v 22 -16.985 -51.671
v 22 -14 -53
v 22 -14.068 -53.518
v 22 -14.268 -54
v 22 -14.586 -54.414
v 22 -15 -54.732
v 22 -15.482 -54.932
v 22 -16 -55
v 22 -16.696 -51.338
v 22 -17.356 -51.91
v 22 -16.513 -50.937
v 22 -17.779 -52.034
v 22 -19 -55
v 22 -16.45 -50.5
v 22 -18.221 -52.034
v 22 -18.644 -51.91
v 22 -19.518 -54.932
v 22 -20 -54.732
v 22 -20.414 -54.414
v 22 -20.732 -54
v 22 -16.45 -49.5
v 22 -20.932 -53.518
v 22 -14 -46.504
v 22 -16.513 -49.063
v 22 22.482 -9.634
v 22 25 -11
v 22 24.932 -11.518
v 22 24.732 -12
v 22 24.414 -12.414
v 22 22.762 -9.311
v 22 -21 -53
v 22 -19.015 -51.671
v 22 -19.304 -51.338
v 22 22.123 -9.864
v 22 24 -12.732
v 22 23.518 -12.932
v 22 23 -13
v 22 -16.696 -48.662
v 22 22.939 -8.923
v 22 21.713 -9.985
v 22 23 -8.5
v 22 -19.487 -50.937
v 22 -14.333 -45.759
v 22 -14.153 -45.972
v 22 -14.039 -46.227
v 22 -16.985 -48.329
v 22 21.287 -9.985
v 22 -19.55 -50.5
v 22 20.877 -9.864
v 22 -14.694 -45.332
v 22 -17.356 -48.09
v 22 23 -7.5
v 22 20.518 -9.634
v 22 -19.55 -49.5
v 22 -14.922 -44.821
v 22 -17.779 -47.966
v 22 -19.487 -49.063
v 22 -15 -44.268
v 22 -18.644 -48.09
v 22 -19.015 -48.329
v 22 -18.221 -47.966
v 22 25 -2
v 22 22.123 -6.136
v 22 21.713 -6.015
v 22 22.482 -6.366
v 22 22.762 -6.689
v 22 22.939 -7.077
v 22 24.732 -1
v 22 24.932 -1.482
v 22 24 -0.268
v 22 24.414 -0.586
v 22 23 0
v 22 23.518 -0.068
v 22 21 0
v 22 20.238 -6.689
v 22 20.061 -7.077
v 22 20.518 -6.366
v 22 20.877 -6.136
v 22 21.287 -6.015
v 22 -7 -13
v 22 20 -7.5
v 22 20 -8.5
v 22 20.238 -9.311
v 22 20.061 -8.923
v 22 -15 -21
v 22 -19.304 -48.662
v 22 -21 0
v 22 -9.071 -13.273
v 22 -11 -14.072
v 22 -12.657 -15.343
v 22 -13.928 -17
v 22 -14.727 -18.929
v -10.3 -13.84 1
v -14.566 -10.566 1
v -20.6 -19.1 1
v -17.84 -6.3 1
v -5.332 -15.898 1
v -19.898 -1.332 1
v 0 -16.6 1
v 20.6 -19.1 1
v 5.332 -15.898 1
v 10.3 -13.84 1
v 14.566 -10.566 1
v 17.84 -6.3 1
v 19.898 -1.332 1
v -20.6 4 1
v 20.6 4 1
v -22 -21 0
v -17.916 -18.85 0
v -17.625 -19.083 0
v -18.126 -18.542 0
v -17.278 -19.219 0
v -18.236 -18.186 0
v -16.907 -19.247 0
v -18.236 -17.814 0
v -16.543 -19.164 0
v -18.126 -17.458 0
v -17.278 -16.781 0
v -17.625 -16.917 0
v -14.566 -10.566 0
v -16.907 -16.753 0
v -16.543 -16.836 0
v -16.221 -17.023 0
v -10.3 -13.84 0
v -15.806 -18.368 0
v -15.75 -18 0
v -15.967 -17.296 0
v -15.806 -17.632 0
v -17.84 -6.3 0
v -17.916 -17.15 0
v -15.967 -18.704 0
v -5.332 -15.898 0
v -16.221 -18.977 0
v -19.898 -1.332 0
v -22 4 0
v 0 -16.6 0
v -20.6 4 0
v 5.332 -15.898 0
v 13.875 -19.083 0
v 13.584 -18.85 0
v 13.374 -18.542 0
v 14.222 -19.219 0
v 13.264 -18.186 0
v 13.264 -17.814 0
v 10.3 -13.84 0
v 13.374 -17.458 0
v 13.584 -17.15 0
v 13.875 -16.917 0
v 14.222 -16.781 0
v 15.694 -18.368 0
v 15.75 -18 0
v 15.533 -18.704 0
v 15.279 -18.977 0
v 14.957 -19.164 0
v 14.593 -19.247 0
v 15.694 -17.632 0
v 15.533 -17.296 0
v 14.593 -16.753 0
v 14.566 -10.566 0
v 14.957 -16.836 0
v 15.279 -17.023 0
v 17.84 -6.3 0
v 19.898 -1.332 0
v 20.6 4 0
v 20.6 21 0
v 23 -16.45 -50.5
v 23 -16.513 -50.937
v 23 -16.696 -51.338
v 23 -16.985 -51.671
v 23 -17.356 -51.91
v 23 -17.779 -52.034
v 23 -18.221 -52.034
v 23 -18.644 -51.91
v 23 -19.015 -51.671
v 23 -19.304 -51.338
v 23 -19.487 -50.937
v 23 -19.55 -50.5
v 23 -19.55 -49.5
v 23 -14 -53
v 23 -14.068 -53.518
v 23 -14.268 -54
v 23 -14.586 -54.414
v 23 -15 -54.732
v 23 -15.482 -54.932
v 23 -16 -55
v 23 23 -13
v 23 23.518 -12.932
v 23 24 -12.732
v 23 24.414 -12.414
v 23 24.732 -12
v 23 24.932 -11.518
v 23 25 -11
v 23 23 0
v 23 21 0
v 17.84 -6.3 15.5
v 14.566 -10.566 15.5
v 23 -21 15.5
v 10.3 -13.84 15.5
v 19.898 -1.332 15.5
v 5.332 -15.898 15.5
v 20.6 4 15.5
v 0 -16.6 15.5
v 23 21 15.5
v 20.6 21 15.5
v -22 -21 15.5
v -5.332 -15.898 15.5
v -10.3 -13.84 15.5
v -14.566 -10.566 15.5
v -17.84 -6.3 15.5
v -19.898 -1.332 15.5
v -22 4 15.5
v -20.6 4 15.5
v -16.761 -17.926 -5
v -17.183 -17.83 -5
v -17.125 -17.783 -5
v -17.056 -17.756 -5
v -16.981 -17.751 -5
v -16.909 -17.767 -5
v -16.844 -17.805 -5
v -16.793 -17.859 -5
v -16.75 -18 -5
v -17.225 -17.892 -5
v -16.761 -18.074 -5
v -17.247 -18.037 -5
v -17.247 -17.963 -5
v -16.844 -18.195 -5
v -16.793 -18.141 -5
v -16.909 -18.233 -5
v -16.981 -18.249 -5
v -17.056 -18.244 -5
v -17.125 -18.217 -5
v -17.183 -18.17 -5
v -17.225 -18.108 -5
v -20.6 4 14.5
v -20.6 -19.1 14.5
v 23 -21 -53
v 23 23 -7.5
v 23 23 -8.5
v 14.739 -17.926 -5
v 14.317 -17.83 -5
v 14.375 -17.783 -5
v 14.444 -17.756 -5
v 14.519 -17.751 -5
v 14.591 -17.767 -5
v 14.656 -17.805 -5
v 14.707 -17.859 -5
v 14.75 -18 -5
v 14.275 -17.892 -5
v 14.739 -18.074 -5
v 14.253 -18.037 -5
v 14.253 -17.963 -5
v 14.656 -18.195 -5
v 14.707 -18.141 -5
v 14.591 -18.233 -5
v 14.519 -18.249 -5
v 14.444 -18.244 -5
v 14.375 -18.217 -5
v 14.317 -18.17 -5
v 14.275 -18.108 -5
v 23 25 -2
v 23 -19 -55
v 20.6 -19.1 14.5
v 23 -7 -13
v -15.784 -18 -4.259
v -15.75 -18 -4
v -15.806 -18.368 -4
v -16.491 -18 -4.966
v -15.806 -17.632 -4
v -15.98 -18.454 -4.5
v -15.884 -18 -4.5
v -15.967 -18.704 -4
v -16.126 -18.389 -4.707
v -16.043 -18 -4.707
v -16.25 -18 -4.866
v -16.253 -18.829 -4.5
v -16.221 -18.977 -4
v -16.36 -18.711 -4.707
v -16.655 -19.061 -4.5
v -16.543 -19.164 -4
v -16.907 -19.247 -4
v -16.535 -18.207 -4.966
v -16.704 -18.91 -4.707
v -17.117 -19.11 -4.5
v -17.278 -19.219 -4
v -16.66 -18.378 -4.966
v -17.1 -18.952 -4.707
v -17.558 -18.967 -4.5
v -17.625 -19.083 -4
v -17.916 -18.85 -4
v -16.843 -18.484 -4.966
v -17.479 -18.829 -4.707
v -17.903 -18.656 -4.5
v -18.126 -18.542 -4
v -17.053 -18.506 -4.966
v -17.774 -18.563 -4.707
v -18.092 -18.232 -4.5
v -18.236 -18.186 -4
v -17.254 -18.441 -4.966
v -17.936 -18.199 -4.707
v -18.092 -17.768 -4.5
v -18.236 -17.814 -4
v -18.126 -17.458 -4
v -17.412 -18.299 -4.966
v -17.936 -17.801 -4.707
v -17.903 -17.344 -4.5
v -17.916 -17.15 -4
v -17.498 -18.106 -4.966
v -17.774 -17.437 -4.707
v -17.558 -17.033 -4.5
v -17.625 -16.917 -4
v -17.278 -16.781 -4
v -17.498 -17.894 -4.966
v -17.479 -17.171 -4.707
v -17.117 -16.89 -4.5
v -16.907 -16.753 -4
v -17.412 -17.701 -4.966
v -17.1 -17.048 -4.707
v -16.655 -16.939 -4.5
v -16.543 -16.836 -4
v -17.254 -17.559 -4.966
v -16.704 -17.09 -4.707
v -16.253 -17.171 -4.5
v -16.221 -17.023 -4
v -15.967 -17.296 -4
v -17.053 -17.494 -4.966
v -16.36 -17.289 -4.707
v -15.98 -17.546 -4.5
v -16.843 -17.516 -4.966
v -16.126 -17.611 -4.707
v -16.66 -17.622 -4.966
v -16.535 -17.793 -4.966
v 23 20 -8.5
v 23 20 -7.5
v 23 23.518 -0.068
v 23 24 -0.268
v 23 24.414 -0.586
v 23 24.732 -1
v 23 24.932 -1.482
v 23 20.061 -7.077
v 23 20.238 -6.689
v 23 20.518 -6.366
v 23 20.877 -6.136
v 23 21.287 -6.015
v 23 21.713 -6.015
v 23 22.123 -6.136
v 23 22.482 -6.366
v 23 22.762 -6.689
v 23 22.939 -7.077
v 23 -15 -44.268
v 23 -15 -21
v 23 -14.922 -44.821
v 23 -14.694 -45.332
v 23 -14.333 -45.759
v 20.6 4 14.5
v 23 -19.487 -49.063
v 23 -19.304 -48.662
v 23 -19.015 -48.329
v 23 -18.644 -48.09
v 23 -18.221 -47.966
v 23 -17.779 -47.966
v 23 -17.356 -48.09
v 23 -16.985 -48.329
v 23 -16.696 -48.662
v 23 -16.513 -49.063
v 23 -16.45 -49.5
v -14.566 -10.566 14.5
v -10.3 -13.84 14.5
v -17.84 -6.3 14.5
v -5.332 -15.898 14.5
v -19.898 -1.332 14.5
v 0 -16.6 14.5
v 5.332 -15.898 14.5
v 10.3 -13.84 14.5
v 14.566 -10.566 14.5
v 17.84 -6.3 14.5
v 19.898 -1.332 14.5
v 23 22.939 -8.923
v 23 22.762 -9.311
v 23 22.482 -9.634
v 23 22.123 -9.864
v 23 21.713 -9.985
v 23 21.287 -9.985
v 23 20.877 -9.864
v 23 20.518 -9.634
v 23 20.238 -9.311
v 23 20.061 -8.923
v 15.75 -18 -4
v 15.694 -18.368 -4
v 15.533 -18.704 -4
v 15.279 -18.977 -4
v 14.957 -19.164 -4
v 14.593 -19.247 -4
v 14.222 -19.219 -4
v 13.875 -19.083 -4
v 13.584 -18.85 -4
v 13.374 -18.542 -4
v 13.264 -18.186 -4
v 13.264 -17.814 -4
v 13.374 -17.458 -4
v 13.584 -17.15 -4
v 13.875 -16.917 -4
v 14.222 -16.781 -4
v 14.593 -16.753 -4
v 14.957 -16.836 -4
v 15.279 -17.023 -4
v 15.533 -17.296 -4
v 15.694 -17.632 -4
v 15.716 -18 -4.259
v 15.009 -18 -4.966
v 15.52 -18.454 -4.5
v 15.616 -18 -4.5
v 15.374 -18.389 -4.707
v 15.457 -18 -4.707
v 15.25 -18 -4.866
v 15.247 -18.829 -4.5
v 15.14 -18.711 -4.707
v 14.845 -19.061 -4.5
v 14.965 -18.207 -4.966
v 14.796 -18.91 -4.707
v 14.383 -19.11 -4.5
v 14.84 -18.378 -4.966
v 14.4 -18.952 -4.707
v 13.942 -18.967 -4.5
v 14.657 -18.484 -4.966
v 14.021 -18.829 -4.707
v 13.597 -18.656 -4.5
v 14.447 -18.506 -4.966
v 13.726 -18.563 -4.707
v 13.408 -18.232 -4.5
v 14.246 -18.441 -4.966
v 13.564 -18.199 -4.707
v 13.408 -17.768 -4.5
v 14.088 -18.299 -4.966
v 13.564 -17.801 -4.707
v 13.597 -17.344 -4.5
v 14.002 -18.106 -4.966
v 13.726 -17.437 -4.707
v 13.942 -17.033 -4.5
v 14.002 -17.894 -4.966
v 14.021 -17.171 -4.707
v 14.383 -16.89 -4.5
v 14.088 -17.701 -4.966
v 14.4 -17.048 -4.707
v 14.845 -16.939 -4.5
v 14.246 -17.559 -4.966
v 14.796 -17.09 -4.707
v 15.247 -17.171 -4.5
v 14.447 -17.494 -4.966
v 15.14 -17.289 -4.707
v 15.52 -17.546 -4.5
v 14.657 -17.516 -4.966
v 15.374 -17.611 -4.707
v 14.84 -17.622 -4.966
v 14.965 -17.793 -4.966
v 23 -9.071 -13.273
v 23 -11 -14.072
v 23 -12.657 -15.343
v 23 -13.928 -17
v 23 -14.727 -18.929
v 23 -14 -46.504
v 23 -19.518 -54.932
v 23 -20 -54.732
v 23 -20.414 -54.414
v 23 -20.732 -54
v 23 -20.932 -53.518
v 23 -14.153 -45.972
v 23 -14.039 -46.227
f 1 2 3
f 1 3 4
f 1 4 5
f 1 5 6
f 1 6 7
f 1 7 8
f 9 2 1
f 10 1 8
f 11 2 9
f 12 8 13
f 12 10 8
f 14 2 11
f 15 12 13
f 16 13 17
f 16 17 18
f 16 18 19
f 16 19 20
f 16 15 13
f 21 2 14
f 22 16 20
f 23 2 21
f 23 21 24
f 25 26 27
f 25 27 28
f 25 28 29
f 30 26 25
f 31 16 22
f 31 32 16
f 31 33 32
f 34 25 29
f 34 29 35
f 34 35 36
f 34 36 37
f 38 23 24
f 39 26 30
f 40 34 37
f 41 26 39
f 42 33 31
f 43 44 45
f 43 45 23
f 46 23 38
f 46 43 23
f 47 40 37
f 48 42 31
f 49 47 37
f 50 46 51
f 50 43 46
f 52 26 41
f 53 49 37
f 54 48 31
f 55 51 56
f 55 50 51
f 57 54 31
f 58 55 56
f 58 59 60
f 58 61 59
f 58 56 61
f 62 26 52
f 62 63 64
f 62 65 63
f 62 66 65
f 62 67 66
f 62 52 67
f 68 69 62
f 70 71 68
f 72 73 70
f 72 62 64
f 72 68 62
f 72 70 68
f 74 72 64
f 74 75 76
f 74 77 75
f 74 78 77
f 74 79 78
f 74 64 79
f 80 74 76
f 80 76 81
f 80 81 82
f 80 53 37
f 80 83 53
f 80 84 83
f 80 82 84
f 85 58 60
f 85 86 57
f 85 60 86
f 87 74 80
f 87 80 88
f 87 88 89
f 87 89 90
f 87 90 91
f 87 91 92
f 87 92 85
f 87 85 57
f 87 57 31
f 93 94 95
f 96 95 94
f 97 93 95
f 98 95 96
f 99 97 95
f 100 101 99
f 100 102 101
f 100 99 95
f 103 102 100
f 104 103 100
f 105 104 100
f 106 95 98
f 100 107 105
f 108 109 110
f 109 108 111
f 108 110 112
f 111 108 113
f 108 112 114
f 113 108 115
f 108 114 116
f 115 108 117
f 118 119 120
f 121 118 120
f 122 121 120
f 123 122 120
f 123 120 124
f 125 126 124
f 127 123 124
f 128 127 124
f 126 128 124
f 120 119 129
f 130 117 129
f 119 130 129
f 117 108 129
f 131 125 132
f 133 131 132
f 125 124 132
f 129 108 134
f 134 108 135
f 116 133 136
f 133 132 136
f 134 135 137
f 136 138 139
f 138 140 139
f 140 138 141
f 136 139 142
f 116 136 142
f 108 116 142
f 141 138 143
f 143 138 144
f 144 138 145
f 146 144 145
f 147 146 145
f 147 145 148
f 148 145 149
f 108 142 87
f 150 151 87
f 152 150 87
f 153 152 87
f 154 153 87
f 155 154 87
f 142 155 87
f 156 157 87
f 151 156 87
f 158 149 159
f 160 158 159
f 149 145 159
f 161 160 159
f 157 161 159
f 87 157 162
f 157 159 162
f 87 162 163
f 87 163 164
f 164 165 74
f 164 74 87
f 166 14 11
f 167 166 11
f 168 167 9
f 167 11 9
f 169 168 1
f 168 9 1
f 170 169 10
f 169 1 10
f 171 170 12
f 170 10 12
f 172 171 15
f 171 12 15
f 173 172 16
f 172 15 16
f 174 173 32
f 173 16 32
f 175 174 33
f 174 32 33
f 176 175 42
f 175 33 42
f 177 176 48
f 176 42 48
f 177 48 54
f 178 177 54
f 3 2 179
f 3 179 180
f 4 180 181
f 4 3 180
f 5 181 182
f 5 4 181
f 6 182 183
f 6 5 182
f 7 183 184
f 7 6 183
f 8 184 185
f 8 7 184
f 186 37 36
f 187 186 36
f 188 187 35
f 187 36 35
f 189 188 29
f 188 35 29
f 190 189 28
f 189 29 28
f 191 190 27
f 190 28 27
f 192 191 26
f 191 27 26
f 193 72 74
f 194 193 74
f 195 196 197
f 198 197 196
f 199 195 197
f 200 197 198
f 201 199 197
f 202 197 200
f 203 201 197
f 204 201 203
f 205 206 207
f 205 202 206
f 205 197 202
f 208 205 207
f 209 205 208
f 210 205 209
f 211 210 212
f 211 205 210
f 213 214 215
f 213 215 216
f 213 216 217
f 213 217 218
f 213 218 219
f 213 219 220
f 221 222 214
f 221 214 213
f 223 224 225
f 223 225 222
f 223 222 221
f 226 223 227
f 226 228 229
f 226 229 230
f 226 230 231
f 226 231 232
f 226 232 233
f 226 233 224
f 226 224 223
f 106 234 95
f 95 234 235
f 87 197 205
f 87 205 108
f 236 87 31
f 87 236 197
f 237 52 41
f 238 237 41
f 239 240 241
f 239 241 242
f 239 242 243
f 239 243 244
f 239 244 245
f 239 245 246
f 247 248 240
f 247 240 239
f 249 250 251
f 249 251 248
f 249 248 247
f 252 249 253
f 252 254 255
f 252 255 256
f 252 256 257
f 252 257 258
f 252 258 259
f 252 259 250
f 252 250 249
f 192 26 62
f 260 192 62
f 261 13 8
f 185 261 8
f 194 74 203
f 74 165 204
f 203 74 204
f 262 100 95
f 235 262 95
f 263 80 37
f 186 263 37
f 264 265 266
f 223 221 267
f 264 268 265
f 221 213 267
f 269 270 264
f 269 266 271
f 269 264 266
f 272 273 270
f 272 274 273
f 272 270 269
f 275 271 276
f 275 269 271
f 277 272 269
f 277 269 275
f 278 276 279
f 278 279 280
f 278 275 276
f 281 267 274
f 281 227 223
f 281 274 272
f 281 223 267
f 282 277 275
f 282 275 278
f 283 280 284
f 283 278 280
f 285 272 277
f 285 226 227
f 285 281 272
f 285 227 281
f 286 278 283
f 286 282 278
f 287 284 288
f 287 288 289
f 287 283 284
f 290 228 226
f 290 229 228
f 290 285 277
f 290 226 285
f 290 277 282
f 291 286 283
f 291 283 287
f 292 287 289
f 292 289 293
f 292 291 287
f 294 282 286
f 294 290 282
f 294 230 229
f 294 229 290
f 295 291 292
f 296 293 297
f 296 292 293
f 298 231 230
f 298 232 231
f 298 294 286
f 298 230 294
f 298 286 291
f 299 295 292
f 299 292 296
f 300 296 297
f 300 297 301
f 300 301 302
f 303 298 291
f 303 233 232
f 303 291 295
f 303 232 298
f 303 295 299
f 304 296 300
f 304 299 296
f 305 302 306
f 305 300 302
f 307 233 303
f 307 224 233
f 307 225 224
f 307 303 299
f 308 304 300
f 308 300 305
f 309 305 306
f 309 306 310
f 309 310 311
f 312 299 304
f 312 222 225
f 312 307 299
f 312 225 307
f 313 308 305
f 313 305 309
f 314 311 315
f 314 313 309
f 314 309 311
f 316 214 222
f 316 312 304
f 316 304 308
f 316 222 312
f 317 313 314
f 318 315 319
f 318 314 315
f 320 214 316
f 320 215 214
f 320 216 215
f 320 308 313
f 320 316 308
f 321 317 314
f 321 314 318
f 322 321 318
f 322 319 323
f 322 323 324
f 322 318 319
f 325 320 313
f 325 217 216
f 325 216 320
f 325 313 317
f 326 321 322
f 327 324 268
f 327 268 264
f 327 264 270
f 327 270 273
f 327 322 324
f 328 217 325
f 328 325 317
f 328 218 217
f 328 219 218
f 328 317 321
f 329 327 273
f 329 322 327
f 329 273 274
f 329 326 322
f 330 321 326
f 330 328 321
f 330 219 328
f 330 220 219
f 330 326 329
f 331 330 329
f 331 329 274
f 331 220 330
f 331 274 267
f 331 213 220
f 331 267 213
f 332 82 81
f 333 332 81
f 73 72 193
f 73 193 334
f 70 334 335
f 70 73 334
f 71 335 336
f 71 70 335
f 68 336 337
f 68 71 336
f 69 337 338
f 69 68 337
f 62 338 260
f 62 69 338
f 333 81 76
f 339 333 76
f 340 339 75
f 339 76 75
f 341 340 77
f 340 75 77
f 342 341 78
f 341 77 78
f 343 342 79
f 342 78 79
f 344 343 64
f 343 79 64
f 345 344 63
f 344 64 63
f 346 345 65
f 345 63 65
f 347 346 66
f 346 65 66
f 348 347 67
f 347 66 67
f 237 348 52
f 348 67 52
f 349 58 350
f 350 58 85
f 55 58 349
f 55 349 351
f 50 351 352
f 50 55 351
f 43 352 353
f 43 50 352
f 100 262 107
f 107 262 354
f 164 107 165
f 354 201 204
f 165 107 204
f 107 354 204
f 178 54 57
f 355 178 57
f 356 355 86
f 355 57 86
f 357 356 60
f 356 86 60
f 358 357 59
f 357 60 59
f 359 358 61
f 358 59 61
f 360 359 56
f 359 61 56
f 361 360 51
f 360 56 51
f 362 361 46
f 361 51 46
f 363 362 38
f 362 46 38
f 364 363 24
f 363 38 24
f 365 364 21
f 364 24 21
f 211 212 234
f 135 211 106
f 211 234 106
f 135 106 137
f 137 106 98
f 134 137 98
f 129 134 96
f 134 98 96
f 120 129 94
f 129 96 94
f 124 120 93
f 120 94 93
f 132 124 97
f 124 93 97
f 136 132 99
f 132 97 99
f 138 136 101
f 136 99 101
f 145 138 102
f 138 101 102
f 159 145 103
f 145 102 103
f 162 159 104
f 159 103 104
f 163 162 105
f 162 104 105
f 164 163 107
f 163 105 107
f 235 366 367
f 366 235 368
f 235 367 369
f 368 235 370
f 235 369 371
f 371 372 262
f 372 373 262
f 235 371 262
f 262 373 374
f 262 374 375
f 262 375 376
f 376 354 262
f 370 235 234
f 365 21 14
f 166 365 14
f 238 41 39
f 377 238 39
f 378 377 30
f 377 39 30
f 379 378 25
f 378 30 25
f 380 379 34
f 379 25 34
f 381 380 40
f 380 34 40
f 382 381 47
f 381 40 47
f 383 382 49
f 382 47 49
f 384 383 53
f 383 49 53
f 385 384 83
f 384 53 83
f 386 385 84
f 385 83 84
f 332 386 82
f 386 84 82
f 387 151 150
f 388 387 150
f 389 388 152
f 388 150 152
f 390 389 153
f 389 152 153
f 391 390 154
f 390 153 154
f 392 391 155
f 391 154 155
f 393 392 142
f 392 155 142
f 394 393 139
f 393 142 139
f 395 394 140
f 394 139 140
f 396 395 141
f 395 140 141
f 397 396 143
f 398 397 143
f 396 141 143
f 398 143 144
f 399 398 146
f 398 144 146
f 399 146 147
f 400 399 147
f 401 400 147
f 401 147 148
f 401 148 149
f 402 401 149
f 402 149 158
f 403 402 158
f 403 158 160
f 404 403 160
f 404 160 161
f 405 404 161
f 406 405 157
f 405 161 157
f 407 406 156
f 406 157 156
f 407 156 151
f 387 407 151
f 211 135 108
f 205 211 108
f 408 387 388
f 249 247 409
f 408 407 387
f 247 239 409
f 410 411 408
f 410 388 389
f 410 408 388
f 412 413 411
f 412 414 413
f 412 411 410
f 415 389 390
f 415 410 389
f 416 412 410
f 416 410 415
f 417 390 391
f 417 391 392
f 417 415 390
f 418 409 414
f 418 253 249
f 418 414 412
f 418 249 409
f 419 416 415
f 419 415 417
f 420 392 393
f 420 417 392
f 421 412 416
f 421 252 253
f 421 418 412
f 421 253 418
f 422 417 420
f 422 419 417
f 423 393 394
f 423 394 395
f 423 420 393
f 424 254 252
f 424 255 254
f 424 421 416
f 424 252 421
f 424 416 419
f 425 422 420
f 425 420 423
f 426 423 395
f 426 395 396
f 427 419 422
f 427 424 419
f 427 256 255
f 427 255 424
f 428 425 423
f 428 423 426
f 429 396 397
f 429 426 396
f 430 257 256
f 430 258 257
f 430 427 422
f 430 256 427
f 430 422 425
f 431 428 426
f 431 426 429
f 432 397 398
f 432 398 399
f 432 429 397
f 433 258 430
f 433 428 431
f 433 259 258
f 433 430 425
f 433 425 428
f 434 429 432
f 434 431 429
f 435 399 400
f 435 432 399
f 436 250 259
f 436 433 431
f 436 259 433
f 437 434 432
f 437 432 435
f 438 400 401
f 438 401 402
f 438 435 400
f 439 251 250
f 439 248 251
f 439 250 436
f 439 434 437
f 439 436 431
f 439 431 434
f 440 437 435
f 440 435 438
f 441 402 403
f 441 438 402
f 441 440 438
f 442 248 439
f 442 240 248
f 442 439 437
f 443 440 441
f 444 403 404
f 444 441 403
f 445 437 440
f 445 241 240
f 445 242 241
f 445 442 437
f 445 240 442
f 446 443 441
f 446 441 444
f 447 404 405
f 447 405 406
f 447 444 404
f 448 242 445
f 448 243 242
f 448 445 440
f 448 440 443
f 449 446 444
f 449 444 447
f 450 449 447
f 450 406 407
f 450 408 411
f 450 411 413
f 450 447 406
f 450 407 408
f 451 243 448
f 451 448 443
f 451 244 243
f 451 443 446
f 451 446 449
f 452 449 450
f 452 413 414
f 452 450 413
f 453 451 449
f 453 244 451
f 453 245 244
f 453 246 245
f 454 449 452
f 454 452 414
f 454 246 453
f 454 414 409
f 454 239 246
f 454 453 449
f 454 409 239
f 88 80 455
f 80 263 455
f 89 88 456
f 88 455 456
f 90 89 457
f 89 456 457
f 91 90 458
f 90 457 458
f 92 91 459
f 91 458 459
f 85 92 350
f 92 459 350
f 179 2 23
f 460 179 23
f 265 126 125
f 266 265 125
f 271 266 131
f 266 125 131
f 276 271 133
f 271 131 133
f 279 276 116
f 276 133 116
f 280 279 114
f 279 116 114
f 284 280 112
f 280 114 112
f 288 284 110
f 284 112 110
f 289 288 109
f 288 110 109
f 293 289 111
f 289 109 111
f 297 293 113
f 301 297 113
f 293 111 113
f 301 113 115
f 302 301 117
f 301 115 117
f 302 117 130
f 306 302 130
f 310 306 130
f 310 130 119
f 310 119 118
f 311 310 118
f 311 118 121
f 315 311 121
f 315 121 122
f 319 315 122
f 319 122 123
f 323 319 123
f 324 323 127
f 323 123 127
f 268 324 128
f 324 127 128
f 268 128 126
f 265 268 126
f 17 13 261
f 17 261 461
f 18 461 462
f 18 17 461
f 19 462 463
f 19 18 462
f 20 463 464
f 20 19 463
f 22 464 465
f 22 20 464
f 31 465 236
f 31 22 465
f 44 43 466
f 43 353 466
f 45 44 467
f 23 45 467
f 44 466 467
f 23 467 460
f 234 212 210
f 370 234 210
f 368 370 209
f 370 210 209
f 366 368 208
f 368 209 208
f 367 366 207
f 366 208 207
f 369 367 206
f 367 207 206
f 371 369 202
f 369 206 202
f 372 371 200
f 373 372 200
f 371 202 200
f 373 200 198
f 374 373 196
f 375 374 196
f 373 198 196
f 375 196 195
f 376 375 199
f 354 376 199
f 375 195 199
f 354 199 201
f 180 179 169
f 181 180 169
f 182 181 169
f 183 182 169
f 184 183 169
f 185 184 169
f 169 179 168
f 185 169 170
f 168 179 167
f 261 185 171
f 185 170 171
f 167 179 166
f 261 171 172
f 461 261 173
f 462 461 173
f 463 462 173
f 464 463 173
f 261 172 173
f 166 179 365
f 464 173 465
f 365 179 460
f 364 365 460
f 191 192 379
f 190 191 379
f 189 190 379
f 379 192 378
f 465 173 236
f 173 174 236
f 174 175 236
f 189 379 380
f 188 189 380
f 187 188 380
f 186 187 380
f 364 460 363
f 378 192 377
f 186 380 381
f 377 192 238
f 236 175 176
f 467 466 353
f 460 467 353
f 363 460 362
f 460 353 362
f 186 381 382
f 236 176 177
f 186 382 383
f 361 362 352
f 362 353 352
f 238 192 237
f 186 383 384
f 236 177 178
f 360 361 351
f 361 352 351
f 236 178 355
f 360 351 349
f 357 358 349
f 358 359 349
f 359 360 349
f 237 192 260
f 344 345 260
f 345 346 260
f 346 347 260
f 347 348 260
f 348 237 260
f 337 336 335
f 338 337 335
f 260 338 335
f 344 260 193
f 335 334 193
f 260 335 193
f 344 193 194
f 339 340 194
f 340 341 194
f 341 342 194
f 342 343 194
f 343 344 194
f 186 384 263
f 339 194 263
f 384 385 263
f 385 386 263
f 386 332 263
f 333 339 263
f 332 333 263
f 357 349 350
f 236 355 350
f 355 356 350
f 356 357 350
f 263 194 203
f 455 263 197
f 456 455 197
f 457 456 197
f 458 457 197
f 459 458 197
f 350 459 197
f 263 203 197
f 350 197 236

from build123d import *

# Parameters (mm, degrees)
F0_W         = 44
F0_H         = 42
F1_DEPTH     = 1
F3_DEPTH     = 13.5
F4_W         = 41.2
F4_H         = 40.1
F5_DEPTH     = 1
F7_DEPTH     = 25
F9_DEPTH     = 1
F11_DEPTH    = 25
F12_W        = 42
F12_H        = 15.5
F12_W_2      = 1
F12_H_2      = 9
F13_DEPTH    = 1
F14_DEPTH    = 25
F15_R        = 8
F16_T1_DEPTH = 1
F16_T3_DEPTH = 11
F16_T5_DEPTH = 11
F16_T7_DEPTH = 11
F16_T9_DEPTH = 11
F8_R         = 1.25
F17_DEPTH    = 5
F18_R        = 1


# Not quite as in the source:
# - a fillet or chamfer that OpenCascade refuses, or shapes differently, is made with other operations: its cross-section is extruded or revolved along the edge and cut away or added
# - a feature names something its author has since deleted; it is built from what else it names


with BuildPart() as f1:
    # F0 (on Top) → F1 (new body)
    with BuildSketch(Plane.XY):
        Rectangle(F0_W, F0_H)
    extrude(amount=F1_DEPTH)

    # F2 (on face) → F3 (join)
    with BuildSketch(Plane.XY.offset(1)):
        Polygon((-20.6, -19.1), (-20.6, 21), (-22, 21), (-22, -21), (22, -21), (22, 21), (20.6, 21), (20.6, -19.1), align=None)
    extrude(amount=F3_DEPTH)

    # F4 (on face) → F5 (join)
    with BuildSketch(Plane.XY.offset(14.5)):
        with Locations((0, 0.95)):
            Rectangle(F4_W, F4_H)
        Polygon((-22, 21), (-22, -21), (22, -21), (22, 21), (20.6, 21), (20.6, -19.1), (-20.6, -19.1), (-20.6, 21), align=None)
    extrude(amount=F5_DEPTH)

    # F6 (on face) → F7 (cut, symmetric)
    with BuildSketch(Plane.XY.offset(1)):
        with BuildLine():
            ThreePointArc((-20.6, 4.0000000362), (-1.81e-08, -16.6), (20.6, 4))
            ThreePointArc((20.6, 4), (18.2212690578, 13.6096490011), (11.6344316578, 21))
            Line((11.6344316578, 21), (-11.6344316578, 21))
            ThreePointArc((-11.6344316578, 21), (-18.2212690493, 13.6096490171), (-20.6, 4.0000000362))
        make_face()
        with BuildLine():
            Line((-20.6, 21), (-20.6, 4.0000000362))
            ThreePointArc((-20.6, 4.0000000362), (-18.2212690493, 13.6096490171), (-11.6344316578, 21))
            Line((-11.6344316578, 21), (-20.6, 21))
        make_face()
        with BuildLine():
            ThreePointArc((11.6344316578, 21), (18.2212690578, 13.6096490011), (20.6, 4))
            Line((20.6, 4), (20.6, 21))
            Line((20.6, 21), (11.6344316578, 21))
        make_face()
    extrude(amount=F7_DEPTH, both=True, mode=Mode.SUBTRACT)

    # F4 (on face) → F9 (join)
    with BuildSketch(Plane.XY.offset(14.5)):
        Polygon((-22, 21), (-22, -21), (22, -21), (22, 21), (20.6, 21), (20.6, -19.1), (-20.6, -19.1), (-20.6, 21), align=None)
    extrude(amount=F9_DEPTH)

    # F10 (on face) → F11 (cut)
    with BuildSketch(Plane.YZ.offset(-20.6)):
        Polygon((21, 0), (21, 15), (21, 15.5), (4, 15.5), (4, 14.5), (4, 1), (4, 0), align=None)
    extrude(amount=-F11_DEPTH, mode=Mode.SUBTRACT)

    # F12 (on face) → F13 (join)
    with BuildSketch(Plane.YZ.offset(22)):
        Polygon((21, 0), (-21, 0), (-21, -13), (-15, -13), (25, -13), (25, 0), align=None)
        with BuildLine():
            Line((23, -7.5), (23, -8.5))
            ThreePointArc((23, -8.5), (21.5, -10), (20, -8.5))
            Line((20, -8.5), (20, -7.5))
            ThreePointArc((20, -7.5), (21.5, -6), (23, -7.5))
        make_face(mode=Mode.SUBTRACT)
        Polygon((-15, -13), (-21, -13), (-21, -55), (-15, -55), (-15, -46), align=None)
        with BuildLine():
            Line((-16.45, -49.5), (-16.45, -50.5))
            ThreePointArc((-16.45, -50.5), (-18, -52.05), (-19.55, -50.5))
            Line((-19.55, -50.5), (-19.55, -49.5))
            ThreePointArc((-19.55, -49.5), (-18, -47.95), (-16.45, -49.5))
        make_face(mode=Mode.SUBTRACT)
        with Locations((0, 7.75)):
            Rectangle(F12_W, F12_H)
        with Locations((-14.5, -50.5)):
            Rectangle(F12_W_2, F12_H_2)
    extrude(amount=F13_DEPTH)

    # F12 (on face) → F14 (cut)
    with BuildSketch(Plane.YZ.offset(22)):
        with BuildLine():
            ThreePointArc((-19.55, -50.5), (-18, -52.05), (-16.45, -50.5))
            Line((-16.45, -50.5), (-16.8157280718, -50.5))
            ThreePointArc((-16.8157280718, -50.5), (-18, -51.05), (-19.1842719282, -50.5))
            Line((-19.1842719282, -50.5), (-19.55, -50.5))
        make_face()
        with BuildLine():
            Line((-16.8157280718, -50.5), (-16.45, -50.5))
            ThreePointArc((-16.45, -50.5), (-16.4708552854, -50.2465903676), (-16.5328599249, -50))
            ThreePointArc((-16.5328599249, -50), (-16.6509275769, -50.2632192327), (-16.8157280718, -50.5))
        make_face()
        with BuildLine():
            ThreePointArc((-16.5328599249, -50), (-16.4708552854, -50.2465903676), (-16.45, -50.5))
            Line((-16.45, -50.5), (-16.45, -49.5))
            ThreePointArc((-16.45, -49.5), (-16.4708552854, -49.7534096324), (-16.5328599249, -50))
        make_face()
        with BuildLine():
            ThreePointArc((-16.5328599249, -50), (-16.4708552854, -49.7534096324), (-16.45, -49.5))
            Line((-16.45, -49.5), (-16.8157280718, -49.5))
            ThreePointArc((-16.8157280718, -49.5), (-16.6509275769, -49.7367807673), (-16.5328599249, -50))
        make_face()
        with BuildLine():
            Line((-16.8157280718, -49.5), (-16.45, -49.5))
            ThreePointArc((-16.45, -49.5), (-18, -47.95), (-19.55, -49.5))
            Line((-19.55, -49.5), (-19.1842719282, -49.5))
            ThreePointArc((-19.1842719282, -49.5), (-18, -48.95), (-16.8157280718, -49.5))
        make_face()
        with BuildLine():
            Line((-19.1842719282, -49.5), (-16.8157280718, -49.5))
            ThreePointArc((-16.8157280718, -49.5), (-18, -48.95), (-19.1842719282, -49.5))
        make_face()
        with BuildLine():
            Line((-19.1842719282, -50.5), (-16.8157280718, -50.5))
            ThreePointArc((-16.8157280718, -50.5), (-16.6509275769, -50.2632192327), (-16.5328599249, -50))
            ThreePointArc((-16.5328599249, -50), (-16.6509275769, -49.7367807673), (-16.8157280718, -49.5))
            Line((-16.8157280718, -49.5), (-19.1842719282, -49.5))
            ThreePointArc((-19.1842719282, -49.5), (-19.3490724231, -49.7367807673), (-19.4671400751, -50))
            ThreePointArc((-19.4671400751, -50), (-19.3490724231, -50.2632192327), (-19.1842719282, -50.5))
        make_face()
        with BuildLine():
            ThreePointArc((-19.1842719282, -50.5), (-18, -51.05), (-16.8157280718, -50.5))
            Line((-16.8157280718, -50.5), (-19.1842719282, -50.5))
        make_face()
        with BuildLine():
            ThreePointArc((-19.4671400751, -50), (-19.5291447146, -50.2465903676), (-19.55, -50.5))
            Line((-19.55, -50.5), (-19.1842719282, -50.5))
            ThreePointArc((-19.1842719282, -50.5), (-19.3490724231, -50.2632192327), (-19.4671400751, -50))
        make_face()
        with BuildLine():
            Line((-19.55, -49.5), (-19.55, -50.5))
            ThreePointArc((-19.55, -50.5), (-19.5291447146, -50.2465903676), (-19.4671400751, -50))
            ThreePointArc((-19.4671400751, -50), (-19.5291447146, -49.7534096324), (-19.55, -49.5))
        make_face()
        with BuildLine():
            Line((-19.1842719282, -49.5), (-19.55, -49.5))
            ThreePointArc((-19.55, -49.5), (-19.5291447146, -49.7534096324), (-19.4671400751, -50))
            ThreePointArc((-19.4671400751, -50), (-19.3490724231, -49.7367807673), (-19.1842719282, -49.5))
        make_face()
        with BuildLine():
            ThreePointArc((20, -8.5), (21.5, -10), (23, -8.5))
            Line((23, -8.5), (22.6180339887, -8.5))
            ThreePointArc((22.6180339887, -8.5), (21.5, -9), (20.3819660113, -8.5))
            Line((20.3819660113, -8.5), (20, -8.5))
        make_face()
        with BuildLine():
            ThreePointArc((20.0857864376, -8), (20.0216021605, -8.2463470319), (20, -8.5))
            Line((20, -8.5), (20.3819660113, -8.5))
            ThreePointArc((20.3819660113, -8.5), (20.209430585, -8.2644805982), (20.0857864376, -8))
        make_face()
        with BuildLine():
            Line((20.3819660113, -7.5), (20, -7.5))
            ThreePointArc((20, -7.5), (20.0216021605, -7.7536529681), (20.0857864376, -8))
            ThreePointArc((20.0857864376, -8), (20.209430585, -7.7355194018), (20.3819660113, -7.5))
        make_face()
        with BuildLine():
            Line((22.6180339887, -7.5), (23, -7.5))
            ThreePointArc((23, -7.5), (21.5, -6), (20, -7.5))
            Line((20, -7.5), (20.3819660113, -7.5))
            ThreePointArc((20.3819660113, -7.5), (21.5, -7), (22.6180339887, -7.5))
        make_face()
        with BuildLine():
            Line((20.3819660113, -7.5), (22.6180339887, -7.5))
            ThreePointArc((22.6180339887, -7.5), (21.5, -7), (20.3819660113, -7.5))
        make_face()
        with BuildLine():
            Line((20.3819660113, -8.5), (22.6180339887, -8.5))
            ThreePointArc((22.6180339887, -8.5), (22.790569415, -8.2644805982), (22.9142135624, -8))
            ThreePointArc((22.9142135624, -8), (22.790569415, -7.7355194018), (22.6180339887, -7.5))
            Line((22.6180339887, -7.5), (20.3819660113, -7.5))
            ThreePointArc((20.3819660113, -7.5), (20.209430585, -7.7355194018), (20.0857864376, -8))
            ThreePointArc((20.0857864376, -8), (20.209430585, -8.2644805982), (20.3819660113, -8.5))
        make_face()
        with BuildLine():
            ThreePointArc((20.3819660113, -8.5), (21.5, -9), (22.6180339887, -8.5))
            Line((22.6180339887, -8.5), (20.3819660113, -8.5))
        make_face()
        with BuildLine():
            ThreePointArc((22.9142135624, -8), (22.9783978395, -8.2463470319), (23, -8.5))
            Line((23, -8.5), (23, -7.5))
            ThreePointArc((23, -7.5), (22.9783978395, -7.7536529681), (22.9142135624, -8))
        make_face()
        with BuildLine():
            ThreePointArc((22.9142135624, -8), (22.9783978395, -7.7536529681), (23, -7.5))
            Line((23, -7.5), (22.6180339887, -7.5))
            ThreePointArc((22.6180339887, -7.5), (22.790569415, -7.7355194018), (22.9142135624, -8))
        make_face()
        with BuildLine():
            Line((22.6180339887, -8.5), (23, -8.5))
            ThreePointArc((23, -8.5), (22.9783978395, -8.2463470319), (22.9142135624, -8))
            ThreePointArc((22.9142135624, -8), (22.790569415, -8.2644805982), (22.6180339887, -8.5))
        make_face()
        with BuildLine():
            Line((20, -7.5), (20, -8.5))
            ThreePointArc((20, -8.5), (20.0216021605, -8.2463470319), (20.0857864376, -8))
            ThreePointArc((20.0857864376, -8), (20.0216021605, -7.7536529681), (20, -7.5))
        make_face()
    extrude(amount=-F14_DEPTH, mode=Mode.SUBTRACT)

    # F15
    f15_edges = [f1.edges().sort_by_distance(p)[0] for p in [
        (22.5, -15, -13),
    ]]
    fillet(f15_edges, radius=F15_R)

    # F16: fillet of radius 2 on 5 edges, made by hand

    # F16_s2 → F16_t1 (join)
    with BuildSketch(Plane.YZ.offset(22)):
        with BuildLine():
            ThreePointArc((-15, -44.2679491924), (-14.7320508076, -45.2679491924), (-14, -46))
            Line((-14, -46), (-15, -46))
            Line((-15, -46), (-15, -44.2679491924))
        make_face()
    extrude(amount=F16_T1_DEPTH)

    # F16_s4 → F16_t3 (cut)
    with BuildSketch(Plane.YZ.offset(17)):
        with BuildLine():
            ThreePointArc((23, -13), (24.4142135624, -12.4142135624), (25, -11))
            Line((25, -11), (25, -13))
            Line((25, -13), (23, -13))
        make_face()
    extrude(amount=F16_T3_DEPTH, mode=Mode.SUBTRACT)

    # F16_s6 → F16_t5 (cut)
    with BuildSketch(Plane.YZ.offset(17)):
        with BuildLine():
            ThreePointArc((23, 0), (24.4142135624, -0.5857864376), (25, -2))
            Line((25, -2), (25, 0))
            Line((25, 0), (23, 0))
        make_face()
    extrude(amount=F16_T5_DEPTH, mode=Mode.SUBTRACT)

    # F16_s8 → F16_t7 (cut)
    with BuildSketch(Plane.YZ.offset(17)):
        with BuildLine():
            ThreePointArc((-14, -53), (-14.5857864376, -54.4142135624), (-16, -55))
            Line((-16, -55), (-14, -55))
            Line((-14, -55), (-14, -53))
        make_face()
    extrude(amount=F16_T7_DEPTH, mode=Mode.SUBTRACT)

    # F16_s10 → F16_t9 (cut)
    with BuildSketch(Plane.YZ.offset(17)):
        with BuildLine():
            ThreePointArc((-19, -55), (-20.4142135624, -54.4142135624), (-21, -53))
            Line((-21, -53), (-21, -55))
            Line((-21, -55), (-19, -55))
        make_face()
    extrude(amount=F16_T9_DEPTH, mode=Mode.SUBTRACT)

    # F8 (on face) → F17 (join)
    with BuildSketch(Plane(origin=(0, 0, 0), x_dir=(1, 0, 0), z_dir=(0, 0, -1))):
        with Locations((-17, 18)):
            Circle(F8_R)
        with Locations((14.5, 18)):
            Circle(F8_R)
    extrude(amount=F17_DEPTH)

    # F18
    f18_edges = [f1.edges().sort_by_distance(p)[0] for p in [
        (-18.25, -18, -5),
        (13.25, -18, -5),
        (22.5, -14, -46),
    ]]
    fillet(f18_edges, radius=F18_R)


solid = f1.part
